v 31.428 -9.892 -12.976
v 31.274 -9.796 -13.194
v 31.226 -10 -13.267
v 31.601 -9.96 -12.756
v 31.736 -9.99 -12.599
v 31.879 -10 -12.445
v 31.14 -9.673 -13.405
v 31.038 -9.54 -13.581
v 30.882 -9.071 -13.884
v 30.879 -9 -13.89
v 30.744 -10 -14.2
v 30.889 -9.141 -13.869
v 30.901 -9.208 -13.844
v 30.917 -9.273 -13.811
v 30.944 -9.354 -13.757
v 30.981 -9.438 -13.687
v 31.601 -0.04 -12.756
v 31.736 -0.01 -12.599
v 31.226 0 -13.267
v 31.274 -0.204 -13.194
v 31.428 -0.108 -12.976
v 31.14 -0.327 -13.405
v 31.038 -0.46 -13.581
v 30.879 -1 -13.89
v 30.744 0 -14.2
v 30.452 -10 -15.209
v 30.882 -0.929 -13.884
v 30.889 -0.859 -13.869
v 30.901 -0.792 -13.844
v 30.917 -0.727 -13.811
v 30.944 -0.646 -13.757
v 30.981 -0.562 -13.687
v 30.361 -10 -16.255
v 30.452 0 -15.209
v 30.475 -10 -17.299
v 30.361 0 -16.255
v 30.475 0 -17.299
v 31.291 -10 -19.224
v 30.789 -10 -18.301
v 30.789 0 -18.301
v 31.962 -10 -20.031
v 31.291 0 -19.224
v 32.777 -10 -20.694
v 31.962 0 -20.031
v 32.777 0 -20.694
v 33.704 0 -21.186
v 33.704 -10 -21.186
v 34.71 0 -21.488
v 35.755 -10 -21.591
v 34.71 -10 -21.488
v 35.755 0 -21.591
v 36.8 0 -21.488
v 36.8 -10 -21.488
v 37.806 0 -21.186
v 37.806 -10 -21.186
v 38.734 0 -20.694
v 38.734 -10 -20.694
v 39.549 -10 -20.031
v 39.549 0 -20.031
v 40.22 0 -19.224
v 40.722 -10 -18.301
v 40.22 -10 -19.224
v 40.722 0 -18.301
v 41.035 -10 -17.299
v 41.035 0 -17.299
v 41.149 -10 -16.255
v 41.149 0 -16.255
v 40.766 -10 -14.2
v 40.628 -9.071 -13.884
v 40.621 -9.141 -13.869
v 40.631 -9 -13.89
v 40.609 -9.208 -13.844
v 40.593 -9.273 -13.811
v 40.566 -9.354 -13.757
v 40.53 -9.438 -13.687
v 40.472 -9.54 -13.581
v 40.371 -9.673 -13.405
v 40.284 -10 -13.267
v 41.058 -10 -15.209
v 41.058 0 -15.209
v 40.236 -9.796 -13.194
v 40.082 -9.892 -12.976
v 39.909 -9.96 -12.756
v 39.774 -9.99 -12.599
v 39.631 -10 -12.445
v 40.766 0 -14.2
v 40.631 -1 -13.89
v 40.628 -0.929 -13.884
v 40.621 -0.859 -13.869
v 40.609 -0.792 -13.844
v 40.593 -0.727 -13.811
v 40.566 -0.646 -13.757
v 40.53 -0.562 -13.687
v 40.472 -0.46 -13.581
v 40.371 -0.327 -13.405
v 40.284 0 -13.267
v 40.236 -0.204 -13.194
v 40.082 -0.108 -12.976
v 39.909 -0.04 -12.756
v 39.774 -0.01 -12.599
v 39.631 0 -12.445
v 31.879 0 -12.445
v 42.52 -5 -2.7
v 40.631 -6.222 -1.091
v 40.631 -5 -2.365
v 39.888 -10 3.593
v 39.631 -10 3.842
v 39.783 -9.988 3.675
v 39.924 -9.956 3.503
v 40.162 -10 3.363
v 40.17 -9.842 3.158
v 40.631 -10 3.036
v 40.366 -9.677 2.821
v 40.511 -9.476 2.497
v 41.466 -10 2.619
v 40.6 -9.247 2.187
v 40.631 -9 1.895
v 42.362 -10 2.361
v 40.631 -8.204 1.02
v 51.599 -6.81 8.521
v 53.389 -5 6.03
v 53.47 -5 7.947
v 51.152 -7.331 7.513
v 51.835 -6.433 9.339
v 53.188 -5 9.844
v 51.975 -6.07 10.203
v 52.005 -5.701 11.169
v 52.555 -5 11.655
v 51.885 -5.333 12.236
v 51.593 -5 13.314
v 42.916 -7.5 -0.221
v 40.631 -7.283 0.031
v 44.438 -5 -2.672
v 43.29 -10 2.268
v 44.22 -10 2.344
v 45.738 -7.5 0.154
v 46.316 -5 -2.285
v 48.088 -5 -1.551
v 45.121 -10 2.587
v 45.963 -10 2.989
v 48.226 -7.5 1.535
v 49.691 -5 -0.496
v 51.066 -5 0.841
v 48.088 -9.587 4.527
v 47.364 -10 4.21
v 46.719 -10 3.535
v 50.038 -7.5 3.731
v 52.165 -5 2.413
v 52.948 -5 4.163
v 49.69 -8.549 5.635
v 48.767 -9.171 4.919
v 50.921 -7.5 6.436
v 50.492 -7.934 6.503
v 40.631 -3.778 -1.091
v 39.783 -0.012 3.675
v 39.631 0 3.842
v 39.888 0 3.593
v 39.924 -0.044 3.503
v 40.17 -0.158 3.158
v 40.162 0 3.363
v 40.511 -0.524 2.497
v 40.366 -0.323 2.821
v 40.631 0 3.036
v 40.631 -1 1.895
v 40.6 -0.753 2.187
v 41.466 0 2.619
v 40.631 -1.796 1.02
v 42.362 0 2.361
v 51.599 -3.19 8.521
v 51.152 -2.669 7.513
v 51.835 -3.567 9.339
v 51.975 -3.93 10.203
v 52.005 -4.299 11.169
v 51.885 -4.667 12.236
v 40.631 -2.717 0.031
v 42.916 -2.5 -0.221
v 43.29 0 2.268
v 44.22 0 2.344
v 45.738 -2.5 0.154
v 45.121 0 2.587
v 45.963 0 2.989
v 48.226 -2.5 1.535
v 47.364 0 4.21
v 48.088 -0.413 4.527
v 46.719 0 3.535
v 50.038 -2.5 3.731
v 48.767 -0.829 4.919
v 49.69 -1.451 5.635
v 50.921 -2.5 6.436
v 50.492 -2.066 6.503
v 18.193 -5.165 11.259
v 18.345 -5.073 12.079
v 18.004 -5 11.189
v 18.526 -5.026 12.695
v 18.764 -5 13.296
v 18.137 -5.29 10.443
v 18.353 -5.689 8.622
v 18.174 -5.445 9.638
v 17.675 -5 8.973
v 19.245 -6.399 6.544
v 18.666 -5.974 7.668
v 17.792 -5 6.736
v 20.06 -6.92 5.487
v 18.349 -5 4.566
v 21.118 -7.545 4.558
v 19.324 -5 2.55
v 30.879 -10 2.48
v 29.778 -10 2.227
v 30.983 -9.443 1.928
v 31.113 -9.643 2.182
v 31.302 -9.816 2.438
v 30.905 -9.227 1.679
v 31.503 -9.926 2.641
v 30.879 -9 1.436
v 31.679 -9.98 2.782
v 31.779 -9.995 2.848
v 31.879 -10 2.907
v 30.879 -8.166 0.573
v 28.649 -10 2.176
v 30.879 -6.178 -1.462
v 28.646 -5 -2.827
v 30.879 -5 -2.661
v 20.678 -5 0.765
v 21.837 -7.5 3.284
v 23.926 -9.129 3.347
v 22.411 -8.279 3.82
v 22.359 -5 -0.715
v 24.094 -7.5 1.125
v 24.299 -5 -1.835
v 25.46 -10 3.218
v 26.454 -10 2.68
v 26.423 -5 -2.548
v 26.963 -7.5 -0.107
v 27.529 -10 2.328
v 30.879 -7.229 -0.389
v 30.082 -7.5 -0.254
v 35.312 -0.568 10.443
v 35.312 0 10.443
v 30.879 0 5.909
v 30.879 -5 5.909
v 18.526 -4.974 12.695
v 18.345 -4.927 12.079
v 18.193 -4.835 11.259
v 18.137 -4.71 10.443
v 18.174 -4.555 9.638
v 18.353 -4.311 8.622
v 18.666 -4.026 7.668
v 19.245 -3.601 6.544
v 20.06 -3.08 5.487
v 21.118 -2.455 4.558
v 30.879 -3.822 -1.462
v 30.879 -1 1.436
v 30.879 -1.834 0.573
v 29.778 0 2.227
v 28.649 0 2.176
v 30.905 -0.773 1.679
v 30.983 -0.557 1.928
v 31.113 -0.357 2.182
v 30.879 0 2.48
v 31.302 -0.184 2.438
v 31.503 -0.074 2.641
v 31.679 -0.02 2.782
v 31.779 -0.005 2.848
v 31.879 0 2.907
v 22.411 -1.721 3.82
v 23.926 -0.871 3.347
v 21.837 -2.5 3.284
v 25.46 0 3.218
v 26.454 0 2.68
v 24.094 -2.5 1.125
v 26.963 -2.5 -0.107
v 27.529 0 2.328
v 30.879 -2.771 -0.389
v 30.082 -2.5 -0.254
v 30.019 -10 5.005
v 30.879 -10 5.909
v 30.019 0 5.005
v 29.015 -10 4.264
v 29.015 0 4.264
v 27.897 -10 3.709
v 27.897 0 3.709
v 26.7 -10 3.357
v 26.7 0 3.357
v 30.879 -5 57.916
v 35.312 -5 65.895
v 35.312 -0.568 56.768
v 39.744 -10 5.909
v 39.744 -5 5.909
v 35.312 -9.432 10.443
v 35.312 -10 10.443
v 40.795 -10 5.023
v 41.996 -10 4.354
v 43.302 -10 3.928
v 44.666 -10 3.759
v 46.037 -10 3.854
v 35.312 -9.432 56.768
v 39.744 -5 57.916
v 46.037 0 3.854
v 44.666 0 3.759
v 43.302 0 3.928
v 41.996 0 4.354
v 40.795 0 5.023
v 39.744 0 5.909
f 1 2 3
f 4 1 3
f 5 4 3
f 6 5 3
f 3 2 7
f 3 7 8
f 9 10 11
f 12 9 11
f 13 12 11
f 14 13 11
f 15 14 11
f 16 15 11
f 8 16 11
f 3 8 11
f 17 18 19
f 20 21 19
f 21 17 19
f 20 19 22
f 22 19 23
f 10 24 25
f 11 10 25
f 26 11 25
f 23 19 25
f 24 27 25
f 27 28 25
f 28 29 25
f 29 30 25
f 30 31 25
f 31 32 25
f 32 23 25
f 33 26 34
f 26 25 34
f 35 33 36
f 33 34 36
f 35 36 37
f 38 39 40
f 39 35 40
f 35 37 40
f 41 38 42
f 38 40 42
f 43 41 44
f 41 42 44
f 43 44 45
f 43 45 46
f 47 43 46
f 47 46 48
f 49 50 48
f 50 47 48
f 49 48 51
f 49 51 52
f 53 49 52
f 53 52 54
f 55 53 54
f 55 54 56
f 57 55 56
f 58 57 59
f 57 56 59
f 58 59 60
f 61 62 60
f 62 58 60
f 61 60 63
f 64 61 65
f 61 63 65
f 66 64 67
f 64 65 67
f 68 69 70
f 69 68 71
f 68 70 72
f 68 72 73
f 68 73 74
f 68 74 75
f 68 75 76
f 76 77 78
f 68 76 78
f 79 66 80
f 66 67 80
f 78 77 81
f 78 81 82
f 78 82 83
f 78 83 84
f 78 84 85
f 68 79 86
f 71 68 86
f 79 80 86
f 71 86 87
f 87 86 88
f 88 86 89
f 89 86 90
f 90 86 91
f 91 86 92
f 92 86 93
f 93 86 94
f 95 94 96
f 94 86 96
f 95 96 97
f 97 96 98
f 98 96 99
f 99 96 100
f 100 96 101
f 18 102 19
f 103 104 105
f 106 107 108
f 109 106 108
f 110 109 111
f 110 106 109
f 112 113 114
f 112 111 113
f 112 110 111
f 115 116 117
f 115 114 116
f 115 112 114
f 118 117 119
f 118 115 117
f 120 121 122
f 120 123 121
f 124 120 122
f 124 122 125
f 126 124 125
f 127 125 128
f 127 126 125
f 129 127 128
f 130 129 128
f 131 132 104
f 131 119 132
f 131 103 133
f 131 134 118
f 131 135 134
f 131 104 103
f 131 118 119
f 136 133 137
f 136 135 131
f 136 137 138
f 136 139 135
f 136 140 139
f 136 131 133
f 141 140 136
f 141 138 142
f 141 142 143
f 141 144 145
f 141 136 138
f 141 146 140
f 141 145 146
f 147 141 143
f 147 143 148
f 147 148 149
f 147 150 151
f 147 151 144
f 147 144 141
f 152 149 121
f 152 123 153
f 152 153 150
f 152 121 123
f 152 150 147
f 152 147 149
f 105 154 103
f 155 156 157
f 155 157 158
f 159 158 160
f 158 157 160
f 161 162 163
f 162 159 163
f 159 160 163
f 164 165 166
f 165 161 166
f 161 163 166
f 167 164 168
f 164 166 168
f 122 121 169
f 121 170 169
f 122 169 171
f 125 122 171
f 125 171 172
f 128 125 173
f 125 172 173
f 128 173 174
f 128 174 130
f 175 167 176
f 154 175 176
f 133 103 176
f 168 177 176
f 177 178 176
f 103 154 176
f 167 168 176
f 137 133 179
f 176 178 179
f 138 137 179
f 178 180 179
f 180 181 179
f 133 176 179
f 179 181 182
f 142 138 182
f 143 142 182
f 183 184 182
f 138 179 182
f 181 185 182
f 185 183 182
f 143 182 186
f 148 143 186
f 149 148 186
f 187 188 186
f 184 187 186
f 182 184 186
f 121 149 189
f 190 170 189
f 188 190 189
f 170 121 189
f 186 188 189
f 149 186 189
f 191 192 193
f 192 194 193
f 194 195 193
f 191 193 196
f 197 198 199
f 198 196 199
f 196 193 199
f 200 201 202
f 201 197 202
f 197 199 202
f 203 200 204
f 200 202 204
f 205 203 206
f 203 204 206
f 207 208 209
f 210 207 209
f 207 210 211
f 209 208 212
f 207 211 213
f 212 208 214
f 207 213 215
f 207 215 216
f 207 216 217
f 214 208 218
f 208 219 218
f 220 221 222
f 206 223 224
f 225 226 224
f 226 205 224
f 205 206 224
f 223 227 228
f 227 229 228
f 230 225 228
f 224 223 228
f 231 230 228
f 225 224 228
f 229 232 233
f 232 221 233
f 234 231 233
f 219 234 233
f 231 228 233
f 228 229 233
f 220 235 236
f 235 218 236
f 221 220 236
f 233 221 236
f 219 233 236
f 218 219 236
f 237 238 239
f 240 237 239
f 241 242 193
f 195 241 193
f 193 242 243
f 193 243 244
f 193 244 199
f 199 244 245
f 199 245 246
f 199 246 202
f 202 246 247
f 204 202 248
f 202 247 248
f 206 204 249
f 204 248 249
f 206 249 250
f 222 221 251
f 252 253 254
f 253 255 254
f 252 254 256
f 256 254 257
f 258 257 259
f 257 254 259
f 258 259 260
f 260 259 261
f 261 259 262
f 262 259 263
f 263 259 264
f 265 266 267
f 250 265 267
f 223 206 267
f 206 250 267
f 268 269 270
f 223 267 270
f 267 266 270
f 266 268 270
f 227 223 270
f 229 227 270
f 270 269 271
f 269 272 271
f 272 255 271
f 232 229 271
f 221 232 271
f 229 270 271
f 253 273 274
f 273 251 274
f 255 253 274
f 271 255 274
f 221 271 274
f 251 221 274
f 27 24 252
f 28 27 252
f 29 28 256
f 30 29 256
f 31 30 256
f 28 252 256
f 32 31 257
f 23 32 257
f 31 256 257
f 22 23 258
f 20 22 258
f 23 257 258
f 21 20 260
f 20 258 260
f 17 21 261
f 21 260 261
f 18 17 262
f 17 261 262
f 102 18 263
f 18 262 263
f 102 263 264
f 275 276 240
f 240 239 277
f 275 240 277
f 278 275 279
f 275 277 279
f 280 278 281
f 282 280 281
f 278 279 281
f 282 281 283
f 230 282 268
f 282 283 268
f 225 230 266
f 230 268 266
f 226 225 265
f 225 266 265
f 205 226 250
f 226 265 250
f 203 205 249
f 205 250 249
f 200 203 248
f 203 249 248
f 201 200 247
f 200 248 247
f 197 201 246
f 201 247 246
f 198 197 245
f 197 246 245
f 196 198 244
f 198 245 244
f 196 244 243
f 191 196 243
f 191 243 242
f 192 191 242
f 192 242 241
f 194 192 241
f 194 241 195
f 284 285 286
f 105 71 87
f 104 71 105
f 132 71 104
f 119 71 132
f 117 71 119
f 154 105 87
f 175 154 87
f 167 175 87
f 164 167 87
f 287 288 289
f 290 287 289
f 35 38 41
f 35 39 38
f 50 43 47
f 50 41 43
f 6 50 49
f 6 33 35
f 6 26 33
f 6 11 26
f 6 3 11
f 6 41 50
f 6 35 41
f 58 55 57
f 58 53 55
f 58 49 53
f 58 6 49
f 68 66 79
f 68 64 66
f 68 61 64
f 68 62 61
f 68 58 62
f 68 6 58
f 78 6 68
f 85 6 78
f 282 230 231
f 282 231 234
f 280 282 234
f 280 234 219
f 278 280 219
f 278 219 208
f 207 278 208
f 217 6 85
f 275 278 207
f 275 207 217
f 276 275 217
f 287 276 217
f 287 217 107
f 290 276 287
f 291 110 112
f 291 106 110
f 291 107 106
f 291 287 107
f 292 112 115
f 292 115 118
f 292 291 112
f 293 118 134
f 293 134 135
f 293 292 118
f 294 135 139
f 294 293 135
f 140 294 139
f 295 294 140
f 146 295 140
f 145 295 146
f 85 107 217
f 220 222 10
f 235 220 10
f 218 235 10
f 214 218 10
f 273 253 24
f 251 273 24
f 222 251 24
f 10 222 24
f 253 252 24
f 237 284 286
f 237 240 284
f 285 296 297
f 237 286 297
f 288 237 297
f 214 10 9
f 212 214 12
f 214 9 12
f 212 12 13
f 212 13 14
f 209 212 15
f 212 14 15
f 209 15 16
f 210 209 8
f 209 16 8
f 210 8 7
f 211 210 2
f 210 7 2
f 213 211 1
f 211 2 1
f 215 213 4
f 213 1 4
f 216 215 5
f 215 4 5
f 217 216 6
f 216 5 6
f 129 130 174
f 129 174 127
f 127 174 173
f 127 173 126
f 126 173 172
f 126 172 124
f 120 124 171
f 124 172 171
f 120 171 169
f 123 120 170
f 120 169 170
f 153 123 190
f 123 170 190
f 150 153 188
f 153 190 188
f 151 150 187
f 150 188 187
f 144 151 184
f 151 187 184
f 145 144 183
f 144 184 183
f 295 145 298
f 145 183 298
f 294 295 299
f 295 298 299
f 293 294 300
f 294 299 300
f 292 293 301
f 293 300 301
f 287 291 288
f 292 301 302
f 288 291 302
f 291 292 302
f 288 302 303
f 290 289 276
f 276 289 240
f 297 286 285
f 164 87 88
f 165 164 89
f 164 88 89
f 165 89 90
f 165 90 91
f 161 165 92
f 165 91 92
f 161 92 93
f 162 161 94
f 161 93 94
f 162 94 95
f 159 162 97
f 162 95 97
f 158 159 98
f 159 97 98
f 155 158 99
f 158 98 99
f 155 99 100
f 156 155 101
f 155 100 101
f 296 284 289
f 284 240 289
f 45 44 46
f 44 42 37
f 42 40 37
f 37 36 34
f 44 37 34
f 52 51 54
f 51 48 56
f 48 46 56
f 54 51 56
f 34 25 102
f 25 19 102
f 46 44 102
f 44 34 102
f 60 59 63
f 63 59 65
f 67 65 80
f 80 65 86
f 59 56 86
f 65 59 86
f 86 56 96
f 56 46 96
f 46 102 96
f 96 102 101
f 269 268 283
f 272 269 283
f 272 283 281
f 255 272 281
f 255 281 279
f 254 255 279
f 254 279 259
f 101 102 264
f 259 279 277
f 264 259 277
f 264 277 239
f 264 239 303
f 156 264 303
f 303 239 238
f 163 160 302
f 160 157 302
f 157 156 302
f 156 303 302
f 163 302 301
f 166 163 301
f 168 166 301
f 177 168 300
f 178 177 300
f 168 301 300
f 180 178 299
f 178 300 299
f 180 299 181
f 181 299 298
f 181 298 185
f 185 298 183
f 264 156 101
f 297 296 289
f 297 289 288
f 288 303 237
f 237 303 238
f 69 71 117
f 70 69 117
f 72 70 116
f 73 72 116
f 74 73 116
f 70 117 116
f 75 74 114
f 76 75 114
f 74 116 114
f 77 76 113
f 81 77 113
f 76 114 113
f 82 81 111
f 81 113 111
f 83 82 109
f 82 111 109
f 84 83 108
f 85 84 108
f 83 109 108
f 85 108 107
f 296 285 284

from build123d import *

# Parameters (mm, degrees)
F1_DEPTH    = 10
F2_SIZE     = 4.99999
F3_T1_DEPTH = 67.4287295288
F4_DEPTH    = 10
F5_T4_ANGLE = 302.1740734605
F5_T9_ANGLE = 359.64
F6_T4_ANGLE = 359.64
F6_T9_ANGLE = 302.1740734605
F7_R        = 1


# Not quite as in the source:
# - a fillet or chamfer that OpenCascade refuses, or shapes differently, is made with other operations: its cross-section is extruded or revolved along the edge and cut away or added
# - a fillet or chamfer is up to 0.001 mm smaller than in the source, because OpenCascade refuses the exact size


with BuildPart() as f1:
    # F0 (on Front) → F1 (new body)
    with BuildSketch(Plane.XZ):
        Polygon((35.3119149804, 10.4430096801), (39.7443734109, 5.9087900445), (39.7443734109, 57.9162985086), (35.3119149804, 65.8947229385), (30.8794565499, 57.9162985086), (30.8794565499, 5.9087900445), align=None)
    extrude(amount=F1_DEPTH)

    # F2 (size 5 in the source; OpenCascade refuses exactly that, so slightly less here)
    f2_edges = [f1.edges().sort_by_distance(p)[0] for p in [
        (37.528144, -10, 61.905511),
        (37.528144, 0, 61.905511),
        (33.095686, -10, 61.905511),
        (33.095686, 0, 61.905511),
    ]]
    chamfer(f2_edges, length=F2_SIZE)

    # F3: chamfer of 5 on 4 edges, made by hand

    # F3_s2 → F3_t1 (cut)
    with BuildSketch(Plane.XY.offset(-6.9496248953)):
        Polygon((30.8794565499, -5), (35.8794565499, 0), (30.8794565499, 0), align=None)
        Polygon((30.8794565499, -5), (35.8794565499, -10), (30.8794565499, -10), align=None)
        Polygon((34.7443734109, -10), (39.7443734109, -5), (39.7443734109, -10), align=None)
        Polygon((34.7443734109, 0), (39.7443734109, -5), (39.7443734109, 0), align=None)
    extrude(amount=F3_T1_DEPTH, mode=Mode.SUBTRACT)

    # F0 (on Front) → F4 (join)
    with BuildSketch(Plane.XZ):
        with BuildLine():
            ThreePointArc((51.5925973184, 13.3139307646), (48.6483872163, 4.8435179428), (39.7443734109, 5.9087900445))
            Line((39.7443734109, 5.9087900445), (35.3119149804, 10.4430096801))
            Line((35.3119149804, 10.4430096801), (30.8794565499, 5.9087900445))
            ThreePointArc((30.8794565499, 5.9087900445), (21.5650677315, 4.2615226747), (18.7640711665, 13.2962195203))
            ThreePointArc((18.7640711665, 13.2962195203), (19.9563786111, 1.6237063121), (30.8794565499, -2.6606291067))
            Line((30.8794565499, -2.6606291067), (30.8794565499, -13.8895222917))
            ThreePointArc((30.8794565499, -13.8895222917), (35.755161196, -21.5906926023), (40.6308658421, -13.8895222917))
            Line((40.6308658421, -13.8895222917), (40.6308658421, -2.3651318625))
            ThreePointArc((40.6308658421, -2.3651318625), (51.65255991, 1.6006300969), (51.5925973184, 13.3139307646))
        make_face()
    extrude(amount=F4_DEPTH)

    # F5: chamfer of 5 on 2 edges, made by hand


with BuildPart() as f5_tool2:
    # F5_s3 → F5_t4 (revolve)
    with BuildSketch(Plane(origin=(9.3560149059, 0, -9.9565277283), x_dir=(0, 1, 0), z_dir=(0.6847887183, 0, -0.728741663))):
        Polygon((-10, 33.1289388428), (-5, 38.1289388428), (-10, 38.1289388428), align=None)
    revolve(axis=Axis((28.9307170955, -10, 8.4375560791), (0, -1, 0)), revolution_arc=F5_T4_ANGLE)

    split(bisect_by=Plane.YZ.offset(30.8794565499), keep=Keep.BOTTOM)


with BuildPart() as f1_1:
    add(f1.part)

    # F5_t1: cut F5_tool2
    add(f5_tool2.part, mode=Mode.SUBTRACT)


with BuildPart() as f5_tool7:
    # F5_s8 → F5_t9 (revolve)
    with BuildSketch(Plane(origin=(12.756533571, 0, -16.3882307622), x_dir=(0, 1, 0), z_dir=(-0.6142445443, 0, 0.7891157328))):
        Polygon((-5, -28.604545656), (-10, -33.604545656), (-10, -28.604545656), align=None)
    revolve(axis=Axis((43.3362013883, -10, 7.4148609054), (0, -1, 0)), revolution_arc=F5_T9_ANGLE)

    split(bisect_by=Plane.YZ.offset(40.6308658421), keep=Keep.TOP)


with BuildPart() as f1_2:
    add(f1_1.part)

    # F5_t6: cut F5_tool7
    add(f5_tool7.part, mode=Mode.SUBTRACT)

    # F6: chamfer of 5 on 2 edges, made by hand


with BuildPart() as f6_tool2:
    # F6_s3 → F6_t4 (revolve)
    with BuildSketch(Plane(origin=(12.756533571, 0, -16.3882307622), x_dir=(0, 1, 0), z_dir=(-0.6142445443, 0, 0.7891157328))):
        Polygon((-5, -28.604545656), (0, -33.604545656), (0, -28.604545656), align=None)
    revolve(axis=Axis((43.3362013883, 0, 7.4148609054), (0, -1, 0)), revolution_arc=F6_T4_ANGLE)

    split(bisect_by=Plane.YZ.offset(40.6308658421), keep=Keep.TOP)


with BuildPart() as f1_3:
    add(f1_2.part)

    # F6_t1: cut F6_tool2
    add(f6_tool2.part, mode=Mode.SUBTRACT)


with BuildPart() as f6_tool7:
    # F6_s8 → F6_t9 (revolve)
    with BuildSketch(Plane(origin=(9.3560149059, 0, -9.9565277283), x_dir=(0, 1, 0), z_dir=(0.6847887183, 0, -0.728741663))):
        Polygon((-5, 38.1289388428), (0, 33.1289388428), (0, 38.1289388428), align=None)
    revolve(axis=Axis((28.9307170955, 0, 8.4375560791), (0, -1, 0)), revolution_arc=F6_T9_ANGLE)

    split(bisect_by=Plane.YZ.offset(30.8794565499), keep=Keep.BOTTOM)


with BuildPart() as f1_4:
    add(f1_3.part)

    # F6_t6: cut F6_tool7
    add(f6_tool7.part, mode=Mode.SUBTRACT)

    # F7
    f7_edges = [f1_4.edges().sort_by_distance(p)[0] for p in [
        (40.630866, 0, -5.426826),
        (30.879457, 0, -5.704655),
        (40.630866, -10, -5.426826),
        (30.879457, -10, -5.704655),
    ]]
    fillet(f7_edges, radius=F7_R)


solid = f1_4.part
